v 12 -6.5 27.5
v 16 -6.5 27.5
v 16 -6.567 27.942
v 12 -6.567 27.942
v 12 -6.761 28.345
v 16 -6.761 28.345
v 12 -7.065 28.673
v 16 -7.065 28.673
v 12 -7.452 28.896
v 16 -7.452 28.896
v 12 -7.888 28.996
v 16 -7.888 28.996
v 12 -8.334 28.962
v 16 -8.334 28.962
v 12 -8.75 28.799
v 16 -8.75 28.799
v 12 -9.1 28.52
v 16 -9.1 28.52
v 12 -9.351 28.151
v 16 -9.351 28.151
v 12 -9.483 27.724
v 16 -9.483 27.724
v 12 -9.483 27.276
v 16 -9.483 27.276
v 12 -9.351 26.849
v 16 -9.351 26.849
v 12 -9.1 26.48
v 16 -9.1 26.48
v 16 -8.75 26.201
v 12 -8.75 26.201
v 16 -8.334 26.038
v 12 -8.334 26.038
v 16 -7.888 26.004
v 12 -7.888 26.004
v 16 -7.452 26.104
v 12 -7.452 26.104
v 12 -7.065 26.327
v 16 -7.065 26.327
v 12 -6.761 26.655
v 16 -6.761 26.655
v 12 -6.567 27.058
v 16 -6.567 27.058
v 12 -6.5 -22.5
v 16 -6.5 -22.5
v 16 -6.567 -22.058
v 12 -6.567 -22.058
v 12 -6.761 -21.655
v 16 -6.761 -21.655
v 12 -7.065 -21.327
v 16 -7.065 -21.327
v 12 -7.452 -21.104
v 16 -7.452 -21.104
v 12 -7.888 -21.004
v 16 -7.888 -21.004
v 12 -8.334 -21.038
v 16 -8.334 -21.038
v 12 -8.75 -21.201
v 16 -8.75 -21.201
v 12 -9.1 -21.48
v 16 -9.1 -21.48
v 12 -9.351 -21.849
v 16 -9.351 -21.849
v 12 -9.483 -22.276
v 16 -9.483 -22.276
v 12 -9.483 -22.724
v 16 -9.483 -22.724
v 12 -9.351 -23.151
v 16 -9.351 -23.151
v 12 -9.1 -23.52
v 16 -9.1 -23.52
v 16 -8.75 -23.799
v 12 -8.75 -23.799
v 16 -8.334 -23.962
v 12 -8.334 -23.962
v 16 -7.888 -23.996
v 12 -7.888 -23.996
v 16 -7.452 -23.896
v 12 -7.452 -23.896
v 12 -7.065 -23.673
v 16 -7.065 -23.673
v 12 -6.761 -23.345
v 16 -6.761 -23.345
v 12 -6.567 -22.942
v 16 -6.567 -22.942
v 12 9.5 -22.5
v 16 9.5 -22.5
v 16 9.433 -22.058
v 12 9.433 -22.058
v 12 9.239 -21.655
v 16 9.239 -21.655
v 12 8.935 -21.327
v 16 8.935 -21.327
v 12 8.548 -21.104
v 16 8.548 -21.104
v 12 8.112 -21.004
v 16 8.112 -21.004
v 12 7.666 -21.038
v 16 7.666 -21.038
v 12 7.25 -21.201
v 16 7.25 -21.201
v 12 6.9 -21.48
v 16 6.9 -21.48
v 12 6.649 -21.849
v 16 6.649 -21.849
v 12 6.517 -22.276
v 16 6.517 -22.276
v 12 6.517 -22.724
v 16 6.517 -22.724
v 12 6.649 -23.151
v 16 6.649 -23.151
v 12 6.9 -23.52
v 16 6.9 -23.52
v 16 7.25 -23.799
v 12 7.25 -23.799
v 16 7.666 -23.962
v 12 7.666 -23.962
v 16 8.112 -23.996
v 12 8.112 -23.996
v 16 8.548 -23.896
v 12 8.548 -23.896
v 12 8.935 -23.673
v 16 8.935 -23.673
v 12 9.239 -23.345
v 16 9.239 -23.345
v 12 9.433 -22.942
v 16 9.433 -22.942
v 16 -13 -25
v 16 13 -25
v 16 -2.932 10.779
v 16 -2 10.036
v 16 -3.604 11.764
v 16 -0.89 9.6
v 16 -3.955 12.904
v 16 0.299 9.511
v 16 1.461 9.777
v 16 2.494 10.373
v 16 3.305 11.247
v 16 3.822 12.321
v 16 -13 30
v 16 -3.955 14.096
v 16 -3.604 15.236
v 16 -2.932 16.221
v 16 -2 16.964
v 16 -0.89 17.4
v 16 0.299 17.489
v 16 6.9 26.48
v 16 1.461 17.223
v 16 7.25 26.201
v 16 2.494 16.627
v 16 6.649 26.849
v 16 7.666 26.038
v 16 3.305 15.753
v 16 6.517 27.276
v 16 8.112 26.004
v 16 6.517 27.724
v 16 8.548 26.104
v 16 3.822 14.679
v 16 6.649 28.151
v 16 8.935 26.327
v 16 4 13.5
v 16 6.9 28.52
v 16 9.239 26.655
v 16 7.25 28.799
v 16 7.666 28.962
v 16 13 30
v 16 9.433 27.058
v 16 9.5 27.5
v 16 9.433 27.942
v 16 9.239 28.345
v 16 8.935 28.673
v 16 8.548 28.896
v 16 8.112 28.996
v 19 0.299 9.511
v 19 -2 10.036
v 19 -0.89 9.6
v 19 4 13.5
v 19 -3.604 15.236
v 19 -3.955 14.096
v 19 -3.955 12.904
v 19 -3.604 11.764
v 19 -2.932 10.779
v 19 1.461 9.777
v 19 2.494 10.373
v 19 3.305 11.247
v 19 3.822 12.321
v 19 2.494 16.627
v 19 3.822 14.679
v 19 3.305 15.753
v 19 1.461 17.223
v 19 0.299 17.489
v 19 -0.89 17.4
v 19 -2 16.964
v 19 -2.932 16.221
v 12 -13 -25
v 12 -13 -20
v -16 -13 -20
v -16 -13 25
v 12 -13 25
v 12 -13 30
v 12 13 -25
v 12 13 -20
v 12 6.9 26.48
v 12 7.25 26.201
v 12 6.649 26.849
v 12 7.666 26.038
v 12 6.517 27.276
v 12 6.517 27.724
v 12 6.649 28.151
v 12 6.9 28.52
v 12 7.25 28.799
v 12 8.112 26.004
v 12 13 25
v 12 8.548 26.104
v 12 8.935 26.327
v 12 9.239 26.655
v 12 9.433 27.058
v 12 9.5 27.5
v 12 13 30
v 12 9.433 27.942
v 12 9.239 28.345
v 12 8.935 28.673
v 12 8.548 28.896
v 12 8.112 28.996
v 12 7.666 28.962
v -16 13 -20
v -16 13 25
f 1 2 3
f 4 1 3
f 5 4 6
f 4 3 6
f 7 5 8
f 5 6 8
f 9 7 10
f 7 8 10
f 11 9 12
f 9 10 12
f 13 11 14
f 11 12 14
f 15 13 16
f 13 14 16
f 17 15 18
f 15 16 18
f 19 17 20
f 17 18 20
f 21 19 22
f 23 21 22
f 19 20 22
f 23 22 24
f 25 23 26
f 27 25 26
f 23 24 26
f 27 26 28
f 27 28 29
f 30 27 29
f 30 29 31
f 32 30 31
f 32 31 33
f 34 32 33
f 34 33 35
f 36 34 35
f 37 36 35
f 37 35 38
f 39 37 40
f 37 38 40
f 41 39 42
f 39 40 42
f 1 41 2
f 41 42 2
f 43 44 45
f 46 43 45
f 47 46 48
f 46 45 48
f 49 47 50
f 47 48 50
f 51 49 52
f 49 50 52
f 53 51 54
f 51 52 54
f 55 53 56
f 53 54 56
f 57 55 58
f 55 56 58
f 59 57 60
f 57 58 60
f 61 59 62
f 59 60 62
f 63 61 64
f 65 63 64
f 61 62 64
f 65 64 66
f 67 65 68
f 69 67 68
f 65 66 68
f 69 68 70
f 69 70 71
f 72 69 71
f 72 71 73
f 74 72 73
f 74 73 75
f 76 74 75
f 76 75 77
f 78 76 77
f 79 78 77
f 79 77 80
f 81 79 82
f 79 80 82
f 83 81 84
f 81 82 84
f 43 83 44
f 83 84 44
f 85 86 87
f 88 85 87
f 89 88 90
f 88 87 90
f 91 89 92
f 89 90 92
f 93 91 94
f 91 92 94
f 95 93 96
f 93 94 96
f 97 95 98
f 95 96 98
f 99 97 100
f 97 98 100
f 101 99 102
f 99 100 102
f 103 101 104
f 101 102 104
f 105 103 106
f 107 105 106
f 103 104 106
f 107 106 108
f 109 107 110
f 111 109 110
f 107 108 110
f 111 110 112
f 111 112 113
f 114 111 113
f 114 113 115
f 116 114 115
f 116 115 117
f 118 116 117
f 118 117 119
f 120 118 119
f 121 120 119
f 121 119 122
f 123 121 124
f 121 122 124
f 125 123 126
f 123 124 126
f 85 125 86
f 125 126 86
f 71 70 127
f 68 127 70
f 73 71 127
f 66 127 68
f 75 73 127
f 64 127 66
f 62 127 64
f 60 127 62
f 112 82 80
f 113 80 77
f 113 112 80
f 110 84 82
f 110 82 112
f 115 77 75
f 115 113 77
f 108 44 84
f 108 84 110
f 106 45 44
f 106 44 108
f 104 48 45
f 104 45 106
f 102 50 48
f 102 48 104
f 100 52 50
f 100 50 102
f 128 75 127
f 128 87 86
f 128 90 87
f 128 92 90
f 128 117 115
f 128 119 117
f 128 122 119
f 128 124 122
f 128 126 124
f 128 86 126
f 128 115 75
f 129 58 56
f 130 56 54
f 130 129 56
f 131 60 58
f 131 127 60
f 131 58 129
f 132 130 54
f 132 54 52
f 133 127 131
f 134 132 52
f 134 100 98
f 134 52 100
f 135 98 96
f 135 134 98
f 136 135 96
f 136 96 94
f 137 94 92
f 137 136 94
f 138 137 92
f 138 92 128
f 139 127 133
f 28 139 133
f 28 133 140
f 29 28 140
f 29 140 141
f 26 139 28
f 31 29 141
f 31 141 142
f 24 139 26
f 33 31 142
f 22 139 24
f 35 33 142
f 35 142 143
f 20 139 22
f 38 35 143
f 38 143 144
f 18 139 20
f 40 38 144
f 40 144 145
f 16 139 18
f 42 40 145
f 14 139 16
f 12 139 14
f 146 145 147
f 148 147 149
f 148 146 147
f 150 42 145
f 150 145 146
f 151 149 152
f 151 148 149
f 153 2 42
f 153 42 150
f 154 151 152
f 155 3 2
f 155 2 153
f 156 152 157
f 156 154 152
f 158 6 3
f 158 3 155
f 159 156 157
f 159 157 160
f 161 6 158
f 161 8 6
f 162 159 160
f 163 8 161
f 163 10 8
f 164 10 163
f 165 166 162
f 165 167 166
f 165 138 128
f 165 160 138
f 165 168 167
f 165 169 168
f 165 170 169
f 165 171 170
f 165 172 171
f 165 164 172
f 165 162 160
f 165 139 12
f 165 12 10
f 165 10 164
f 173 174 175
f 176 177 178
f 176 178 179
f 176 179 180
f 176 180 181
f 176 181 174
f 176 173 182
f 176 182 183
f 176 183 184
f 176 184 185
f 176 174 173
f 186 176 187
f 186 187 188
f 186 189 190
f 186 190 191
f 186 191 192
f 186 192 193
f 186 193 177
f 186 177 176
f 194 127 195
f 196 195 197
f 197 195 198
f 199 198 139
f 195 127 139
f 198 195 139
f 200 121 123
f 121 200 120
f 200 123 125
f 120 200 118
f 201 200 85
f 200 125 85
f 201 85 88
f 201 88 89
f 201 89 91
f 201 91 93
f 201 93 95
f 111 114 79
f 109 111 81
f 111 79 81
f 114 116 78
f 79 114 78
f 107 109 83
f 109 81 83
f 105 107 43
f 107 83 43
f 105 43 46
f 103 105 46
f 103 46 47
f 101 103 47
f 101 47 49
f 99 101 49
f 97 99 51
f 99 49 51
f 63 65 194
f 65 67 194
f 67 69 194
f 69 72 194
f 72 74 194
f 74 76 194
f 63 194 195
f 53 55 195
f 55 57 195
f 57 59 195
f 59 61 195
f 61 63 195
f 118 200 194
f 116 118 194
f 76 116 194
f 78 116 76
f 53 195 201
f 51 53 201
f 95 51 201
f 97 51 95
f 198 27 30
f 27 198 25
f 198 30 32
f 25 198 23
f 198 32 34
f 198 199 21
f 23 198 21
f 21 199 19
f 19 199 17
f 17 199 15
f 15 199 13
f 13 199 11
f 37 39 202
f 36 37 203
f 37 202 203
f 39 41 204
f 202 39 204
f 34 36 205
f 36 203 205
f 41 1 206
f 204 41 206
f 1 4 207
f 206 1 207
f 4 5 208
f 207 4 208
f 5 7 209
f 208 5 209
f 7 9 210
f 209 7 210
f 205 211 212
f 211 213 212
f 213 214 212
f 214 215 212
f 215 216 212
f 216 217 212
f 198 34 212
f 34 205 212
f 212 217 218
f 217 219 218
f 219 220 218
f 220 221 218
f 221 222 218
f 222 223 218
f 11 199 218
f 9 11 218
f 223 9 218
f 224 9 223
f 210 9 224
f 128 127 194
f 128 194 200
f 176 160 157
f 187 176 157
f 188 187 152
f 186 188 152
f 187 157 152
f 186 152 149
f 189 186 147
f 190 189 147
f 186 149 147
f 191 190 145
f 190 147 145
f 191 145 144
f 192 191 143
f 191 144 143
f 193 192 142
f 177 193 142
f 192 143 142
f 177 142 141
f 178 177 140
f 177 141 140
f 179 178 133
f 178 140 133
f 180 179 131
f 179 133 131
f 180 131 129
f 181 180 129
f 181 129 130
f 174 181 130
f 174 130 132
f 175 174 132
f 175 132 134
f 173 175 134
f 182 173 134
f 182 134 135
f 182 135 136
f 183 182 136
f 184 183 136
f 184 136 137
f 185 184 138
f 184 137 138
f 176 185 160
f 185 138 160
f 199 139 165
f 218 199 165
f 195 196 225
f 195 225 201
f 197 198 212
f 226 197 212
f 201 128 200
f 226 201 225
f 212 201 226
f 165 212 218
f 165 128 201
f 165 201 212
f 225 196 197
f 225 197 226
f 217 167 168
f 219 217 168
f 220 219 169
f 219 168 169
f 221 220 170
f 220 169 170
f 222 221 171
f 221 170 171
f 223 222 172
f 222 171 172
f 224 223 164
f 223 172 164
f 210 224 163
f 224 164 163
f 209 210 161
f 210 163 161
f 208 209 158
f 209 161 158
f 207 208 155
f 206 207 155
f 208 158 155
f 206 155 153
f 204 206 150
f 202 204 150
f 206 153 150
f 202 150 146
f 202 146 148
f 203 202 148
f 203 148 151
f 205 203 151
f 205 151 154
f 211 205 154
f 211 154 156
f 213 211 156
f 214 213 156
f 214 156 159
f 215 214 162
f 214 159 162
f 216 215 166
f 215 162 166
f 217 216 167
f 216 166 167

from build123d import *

# Parameters (mm, degrees)
F0_W     = 26
F0_H     = 50
F1_DEPTH = 16
F2_R     = 4
F3_DEPTH = 3
F4_W     = 28
F4_H     = 5
F5_DEPTH = 1320.8
F6_W     = 26
F6_H     = 5
F6_R     = 1.5
F7_DEPTH = 4
F8_R     = 1.5
F9_DEPTH = 4


with BuildPart() as f1:
    # F0 (on Right) → F1 (new body, symmetric)
    with BuildSketch(Plane.YZ):
        Rectangle(F0_W, F0_H)
    extrude(amount=F1_DEPTH, both=True)

    # F2 (on face) → F3 (join)
    with BuildSketch(Plane.YZ.offset(16)):
        with Locations((0, 13.5)):
            Circle(F2_R)
    extrude(amount=F3_DEPTH)

    # F4 (on face) → F5 (cut)
    with BuildSketch(Plane.XZ.offset(13)):
        with Locations((-2, -22.5)):
            Rectangle(F4_W, F4_H)
    extrude(amount=-F5_DEPTH, mode=Mode.SUBTRACT)

    # F6 (on face) → F7 (join)
    with BuildSketch(Plane.YZ.offset(16)):
        with Locations((0, 27.5)):
            Rectangle(F6_W, F6_H)
        with Locations((-8, 27.5)):
            Circle(F6_R, mode=Mode.SUBTRACT)
        with Locations((8, 27.5)):
            Circle(F6_R, mode=Mode.SUBTRACT)
    extrude(amount=-F7_DEPTH)

    # F8 (on face) → F9 (cut)
    with BuildSketch(Plane.YZ.offset(16)):
        with Locations((-8, -22.5)):
            Circle(F8_R)
        with Locations((8, -22.5)):
            Circle(F8_R)
    extrude(amount=-F9_DEPTH, mode=Mode.SUBTRACT)


solid = f1.part
